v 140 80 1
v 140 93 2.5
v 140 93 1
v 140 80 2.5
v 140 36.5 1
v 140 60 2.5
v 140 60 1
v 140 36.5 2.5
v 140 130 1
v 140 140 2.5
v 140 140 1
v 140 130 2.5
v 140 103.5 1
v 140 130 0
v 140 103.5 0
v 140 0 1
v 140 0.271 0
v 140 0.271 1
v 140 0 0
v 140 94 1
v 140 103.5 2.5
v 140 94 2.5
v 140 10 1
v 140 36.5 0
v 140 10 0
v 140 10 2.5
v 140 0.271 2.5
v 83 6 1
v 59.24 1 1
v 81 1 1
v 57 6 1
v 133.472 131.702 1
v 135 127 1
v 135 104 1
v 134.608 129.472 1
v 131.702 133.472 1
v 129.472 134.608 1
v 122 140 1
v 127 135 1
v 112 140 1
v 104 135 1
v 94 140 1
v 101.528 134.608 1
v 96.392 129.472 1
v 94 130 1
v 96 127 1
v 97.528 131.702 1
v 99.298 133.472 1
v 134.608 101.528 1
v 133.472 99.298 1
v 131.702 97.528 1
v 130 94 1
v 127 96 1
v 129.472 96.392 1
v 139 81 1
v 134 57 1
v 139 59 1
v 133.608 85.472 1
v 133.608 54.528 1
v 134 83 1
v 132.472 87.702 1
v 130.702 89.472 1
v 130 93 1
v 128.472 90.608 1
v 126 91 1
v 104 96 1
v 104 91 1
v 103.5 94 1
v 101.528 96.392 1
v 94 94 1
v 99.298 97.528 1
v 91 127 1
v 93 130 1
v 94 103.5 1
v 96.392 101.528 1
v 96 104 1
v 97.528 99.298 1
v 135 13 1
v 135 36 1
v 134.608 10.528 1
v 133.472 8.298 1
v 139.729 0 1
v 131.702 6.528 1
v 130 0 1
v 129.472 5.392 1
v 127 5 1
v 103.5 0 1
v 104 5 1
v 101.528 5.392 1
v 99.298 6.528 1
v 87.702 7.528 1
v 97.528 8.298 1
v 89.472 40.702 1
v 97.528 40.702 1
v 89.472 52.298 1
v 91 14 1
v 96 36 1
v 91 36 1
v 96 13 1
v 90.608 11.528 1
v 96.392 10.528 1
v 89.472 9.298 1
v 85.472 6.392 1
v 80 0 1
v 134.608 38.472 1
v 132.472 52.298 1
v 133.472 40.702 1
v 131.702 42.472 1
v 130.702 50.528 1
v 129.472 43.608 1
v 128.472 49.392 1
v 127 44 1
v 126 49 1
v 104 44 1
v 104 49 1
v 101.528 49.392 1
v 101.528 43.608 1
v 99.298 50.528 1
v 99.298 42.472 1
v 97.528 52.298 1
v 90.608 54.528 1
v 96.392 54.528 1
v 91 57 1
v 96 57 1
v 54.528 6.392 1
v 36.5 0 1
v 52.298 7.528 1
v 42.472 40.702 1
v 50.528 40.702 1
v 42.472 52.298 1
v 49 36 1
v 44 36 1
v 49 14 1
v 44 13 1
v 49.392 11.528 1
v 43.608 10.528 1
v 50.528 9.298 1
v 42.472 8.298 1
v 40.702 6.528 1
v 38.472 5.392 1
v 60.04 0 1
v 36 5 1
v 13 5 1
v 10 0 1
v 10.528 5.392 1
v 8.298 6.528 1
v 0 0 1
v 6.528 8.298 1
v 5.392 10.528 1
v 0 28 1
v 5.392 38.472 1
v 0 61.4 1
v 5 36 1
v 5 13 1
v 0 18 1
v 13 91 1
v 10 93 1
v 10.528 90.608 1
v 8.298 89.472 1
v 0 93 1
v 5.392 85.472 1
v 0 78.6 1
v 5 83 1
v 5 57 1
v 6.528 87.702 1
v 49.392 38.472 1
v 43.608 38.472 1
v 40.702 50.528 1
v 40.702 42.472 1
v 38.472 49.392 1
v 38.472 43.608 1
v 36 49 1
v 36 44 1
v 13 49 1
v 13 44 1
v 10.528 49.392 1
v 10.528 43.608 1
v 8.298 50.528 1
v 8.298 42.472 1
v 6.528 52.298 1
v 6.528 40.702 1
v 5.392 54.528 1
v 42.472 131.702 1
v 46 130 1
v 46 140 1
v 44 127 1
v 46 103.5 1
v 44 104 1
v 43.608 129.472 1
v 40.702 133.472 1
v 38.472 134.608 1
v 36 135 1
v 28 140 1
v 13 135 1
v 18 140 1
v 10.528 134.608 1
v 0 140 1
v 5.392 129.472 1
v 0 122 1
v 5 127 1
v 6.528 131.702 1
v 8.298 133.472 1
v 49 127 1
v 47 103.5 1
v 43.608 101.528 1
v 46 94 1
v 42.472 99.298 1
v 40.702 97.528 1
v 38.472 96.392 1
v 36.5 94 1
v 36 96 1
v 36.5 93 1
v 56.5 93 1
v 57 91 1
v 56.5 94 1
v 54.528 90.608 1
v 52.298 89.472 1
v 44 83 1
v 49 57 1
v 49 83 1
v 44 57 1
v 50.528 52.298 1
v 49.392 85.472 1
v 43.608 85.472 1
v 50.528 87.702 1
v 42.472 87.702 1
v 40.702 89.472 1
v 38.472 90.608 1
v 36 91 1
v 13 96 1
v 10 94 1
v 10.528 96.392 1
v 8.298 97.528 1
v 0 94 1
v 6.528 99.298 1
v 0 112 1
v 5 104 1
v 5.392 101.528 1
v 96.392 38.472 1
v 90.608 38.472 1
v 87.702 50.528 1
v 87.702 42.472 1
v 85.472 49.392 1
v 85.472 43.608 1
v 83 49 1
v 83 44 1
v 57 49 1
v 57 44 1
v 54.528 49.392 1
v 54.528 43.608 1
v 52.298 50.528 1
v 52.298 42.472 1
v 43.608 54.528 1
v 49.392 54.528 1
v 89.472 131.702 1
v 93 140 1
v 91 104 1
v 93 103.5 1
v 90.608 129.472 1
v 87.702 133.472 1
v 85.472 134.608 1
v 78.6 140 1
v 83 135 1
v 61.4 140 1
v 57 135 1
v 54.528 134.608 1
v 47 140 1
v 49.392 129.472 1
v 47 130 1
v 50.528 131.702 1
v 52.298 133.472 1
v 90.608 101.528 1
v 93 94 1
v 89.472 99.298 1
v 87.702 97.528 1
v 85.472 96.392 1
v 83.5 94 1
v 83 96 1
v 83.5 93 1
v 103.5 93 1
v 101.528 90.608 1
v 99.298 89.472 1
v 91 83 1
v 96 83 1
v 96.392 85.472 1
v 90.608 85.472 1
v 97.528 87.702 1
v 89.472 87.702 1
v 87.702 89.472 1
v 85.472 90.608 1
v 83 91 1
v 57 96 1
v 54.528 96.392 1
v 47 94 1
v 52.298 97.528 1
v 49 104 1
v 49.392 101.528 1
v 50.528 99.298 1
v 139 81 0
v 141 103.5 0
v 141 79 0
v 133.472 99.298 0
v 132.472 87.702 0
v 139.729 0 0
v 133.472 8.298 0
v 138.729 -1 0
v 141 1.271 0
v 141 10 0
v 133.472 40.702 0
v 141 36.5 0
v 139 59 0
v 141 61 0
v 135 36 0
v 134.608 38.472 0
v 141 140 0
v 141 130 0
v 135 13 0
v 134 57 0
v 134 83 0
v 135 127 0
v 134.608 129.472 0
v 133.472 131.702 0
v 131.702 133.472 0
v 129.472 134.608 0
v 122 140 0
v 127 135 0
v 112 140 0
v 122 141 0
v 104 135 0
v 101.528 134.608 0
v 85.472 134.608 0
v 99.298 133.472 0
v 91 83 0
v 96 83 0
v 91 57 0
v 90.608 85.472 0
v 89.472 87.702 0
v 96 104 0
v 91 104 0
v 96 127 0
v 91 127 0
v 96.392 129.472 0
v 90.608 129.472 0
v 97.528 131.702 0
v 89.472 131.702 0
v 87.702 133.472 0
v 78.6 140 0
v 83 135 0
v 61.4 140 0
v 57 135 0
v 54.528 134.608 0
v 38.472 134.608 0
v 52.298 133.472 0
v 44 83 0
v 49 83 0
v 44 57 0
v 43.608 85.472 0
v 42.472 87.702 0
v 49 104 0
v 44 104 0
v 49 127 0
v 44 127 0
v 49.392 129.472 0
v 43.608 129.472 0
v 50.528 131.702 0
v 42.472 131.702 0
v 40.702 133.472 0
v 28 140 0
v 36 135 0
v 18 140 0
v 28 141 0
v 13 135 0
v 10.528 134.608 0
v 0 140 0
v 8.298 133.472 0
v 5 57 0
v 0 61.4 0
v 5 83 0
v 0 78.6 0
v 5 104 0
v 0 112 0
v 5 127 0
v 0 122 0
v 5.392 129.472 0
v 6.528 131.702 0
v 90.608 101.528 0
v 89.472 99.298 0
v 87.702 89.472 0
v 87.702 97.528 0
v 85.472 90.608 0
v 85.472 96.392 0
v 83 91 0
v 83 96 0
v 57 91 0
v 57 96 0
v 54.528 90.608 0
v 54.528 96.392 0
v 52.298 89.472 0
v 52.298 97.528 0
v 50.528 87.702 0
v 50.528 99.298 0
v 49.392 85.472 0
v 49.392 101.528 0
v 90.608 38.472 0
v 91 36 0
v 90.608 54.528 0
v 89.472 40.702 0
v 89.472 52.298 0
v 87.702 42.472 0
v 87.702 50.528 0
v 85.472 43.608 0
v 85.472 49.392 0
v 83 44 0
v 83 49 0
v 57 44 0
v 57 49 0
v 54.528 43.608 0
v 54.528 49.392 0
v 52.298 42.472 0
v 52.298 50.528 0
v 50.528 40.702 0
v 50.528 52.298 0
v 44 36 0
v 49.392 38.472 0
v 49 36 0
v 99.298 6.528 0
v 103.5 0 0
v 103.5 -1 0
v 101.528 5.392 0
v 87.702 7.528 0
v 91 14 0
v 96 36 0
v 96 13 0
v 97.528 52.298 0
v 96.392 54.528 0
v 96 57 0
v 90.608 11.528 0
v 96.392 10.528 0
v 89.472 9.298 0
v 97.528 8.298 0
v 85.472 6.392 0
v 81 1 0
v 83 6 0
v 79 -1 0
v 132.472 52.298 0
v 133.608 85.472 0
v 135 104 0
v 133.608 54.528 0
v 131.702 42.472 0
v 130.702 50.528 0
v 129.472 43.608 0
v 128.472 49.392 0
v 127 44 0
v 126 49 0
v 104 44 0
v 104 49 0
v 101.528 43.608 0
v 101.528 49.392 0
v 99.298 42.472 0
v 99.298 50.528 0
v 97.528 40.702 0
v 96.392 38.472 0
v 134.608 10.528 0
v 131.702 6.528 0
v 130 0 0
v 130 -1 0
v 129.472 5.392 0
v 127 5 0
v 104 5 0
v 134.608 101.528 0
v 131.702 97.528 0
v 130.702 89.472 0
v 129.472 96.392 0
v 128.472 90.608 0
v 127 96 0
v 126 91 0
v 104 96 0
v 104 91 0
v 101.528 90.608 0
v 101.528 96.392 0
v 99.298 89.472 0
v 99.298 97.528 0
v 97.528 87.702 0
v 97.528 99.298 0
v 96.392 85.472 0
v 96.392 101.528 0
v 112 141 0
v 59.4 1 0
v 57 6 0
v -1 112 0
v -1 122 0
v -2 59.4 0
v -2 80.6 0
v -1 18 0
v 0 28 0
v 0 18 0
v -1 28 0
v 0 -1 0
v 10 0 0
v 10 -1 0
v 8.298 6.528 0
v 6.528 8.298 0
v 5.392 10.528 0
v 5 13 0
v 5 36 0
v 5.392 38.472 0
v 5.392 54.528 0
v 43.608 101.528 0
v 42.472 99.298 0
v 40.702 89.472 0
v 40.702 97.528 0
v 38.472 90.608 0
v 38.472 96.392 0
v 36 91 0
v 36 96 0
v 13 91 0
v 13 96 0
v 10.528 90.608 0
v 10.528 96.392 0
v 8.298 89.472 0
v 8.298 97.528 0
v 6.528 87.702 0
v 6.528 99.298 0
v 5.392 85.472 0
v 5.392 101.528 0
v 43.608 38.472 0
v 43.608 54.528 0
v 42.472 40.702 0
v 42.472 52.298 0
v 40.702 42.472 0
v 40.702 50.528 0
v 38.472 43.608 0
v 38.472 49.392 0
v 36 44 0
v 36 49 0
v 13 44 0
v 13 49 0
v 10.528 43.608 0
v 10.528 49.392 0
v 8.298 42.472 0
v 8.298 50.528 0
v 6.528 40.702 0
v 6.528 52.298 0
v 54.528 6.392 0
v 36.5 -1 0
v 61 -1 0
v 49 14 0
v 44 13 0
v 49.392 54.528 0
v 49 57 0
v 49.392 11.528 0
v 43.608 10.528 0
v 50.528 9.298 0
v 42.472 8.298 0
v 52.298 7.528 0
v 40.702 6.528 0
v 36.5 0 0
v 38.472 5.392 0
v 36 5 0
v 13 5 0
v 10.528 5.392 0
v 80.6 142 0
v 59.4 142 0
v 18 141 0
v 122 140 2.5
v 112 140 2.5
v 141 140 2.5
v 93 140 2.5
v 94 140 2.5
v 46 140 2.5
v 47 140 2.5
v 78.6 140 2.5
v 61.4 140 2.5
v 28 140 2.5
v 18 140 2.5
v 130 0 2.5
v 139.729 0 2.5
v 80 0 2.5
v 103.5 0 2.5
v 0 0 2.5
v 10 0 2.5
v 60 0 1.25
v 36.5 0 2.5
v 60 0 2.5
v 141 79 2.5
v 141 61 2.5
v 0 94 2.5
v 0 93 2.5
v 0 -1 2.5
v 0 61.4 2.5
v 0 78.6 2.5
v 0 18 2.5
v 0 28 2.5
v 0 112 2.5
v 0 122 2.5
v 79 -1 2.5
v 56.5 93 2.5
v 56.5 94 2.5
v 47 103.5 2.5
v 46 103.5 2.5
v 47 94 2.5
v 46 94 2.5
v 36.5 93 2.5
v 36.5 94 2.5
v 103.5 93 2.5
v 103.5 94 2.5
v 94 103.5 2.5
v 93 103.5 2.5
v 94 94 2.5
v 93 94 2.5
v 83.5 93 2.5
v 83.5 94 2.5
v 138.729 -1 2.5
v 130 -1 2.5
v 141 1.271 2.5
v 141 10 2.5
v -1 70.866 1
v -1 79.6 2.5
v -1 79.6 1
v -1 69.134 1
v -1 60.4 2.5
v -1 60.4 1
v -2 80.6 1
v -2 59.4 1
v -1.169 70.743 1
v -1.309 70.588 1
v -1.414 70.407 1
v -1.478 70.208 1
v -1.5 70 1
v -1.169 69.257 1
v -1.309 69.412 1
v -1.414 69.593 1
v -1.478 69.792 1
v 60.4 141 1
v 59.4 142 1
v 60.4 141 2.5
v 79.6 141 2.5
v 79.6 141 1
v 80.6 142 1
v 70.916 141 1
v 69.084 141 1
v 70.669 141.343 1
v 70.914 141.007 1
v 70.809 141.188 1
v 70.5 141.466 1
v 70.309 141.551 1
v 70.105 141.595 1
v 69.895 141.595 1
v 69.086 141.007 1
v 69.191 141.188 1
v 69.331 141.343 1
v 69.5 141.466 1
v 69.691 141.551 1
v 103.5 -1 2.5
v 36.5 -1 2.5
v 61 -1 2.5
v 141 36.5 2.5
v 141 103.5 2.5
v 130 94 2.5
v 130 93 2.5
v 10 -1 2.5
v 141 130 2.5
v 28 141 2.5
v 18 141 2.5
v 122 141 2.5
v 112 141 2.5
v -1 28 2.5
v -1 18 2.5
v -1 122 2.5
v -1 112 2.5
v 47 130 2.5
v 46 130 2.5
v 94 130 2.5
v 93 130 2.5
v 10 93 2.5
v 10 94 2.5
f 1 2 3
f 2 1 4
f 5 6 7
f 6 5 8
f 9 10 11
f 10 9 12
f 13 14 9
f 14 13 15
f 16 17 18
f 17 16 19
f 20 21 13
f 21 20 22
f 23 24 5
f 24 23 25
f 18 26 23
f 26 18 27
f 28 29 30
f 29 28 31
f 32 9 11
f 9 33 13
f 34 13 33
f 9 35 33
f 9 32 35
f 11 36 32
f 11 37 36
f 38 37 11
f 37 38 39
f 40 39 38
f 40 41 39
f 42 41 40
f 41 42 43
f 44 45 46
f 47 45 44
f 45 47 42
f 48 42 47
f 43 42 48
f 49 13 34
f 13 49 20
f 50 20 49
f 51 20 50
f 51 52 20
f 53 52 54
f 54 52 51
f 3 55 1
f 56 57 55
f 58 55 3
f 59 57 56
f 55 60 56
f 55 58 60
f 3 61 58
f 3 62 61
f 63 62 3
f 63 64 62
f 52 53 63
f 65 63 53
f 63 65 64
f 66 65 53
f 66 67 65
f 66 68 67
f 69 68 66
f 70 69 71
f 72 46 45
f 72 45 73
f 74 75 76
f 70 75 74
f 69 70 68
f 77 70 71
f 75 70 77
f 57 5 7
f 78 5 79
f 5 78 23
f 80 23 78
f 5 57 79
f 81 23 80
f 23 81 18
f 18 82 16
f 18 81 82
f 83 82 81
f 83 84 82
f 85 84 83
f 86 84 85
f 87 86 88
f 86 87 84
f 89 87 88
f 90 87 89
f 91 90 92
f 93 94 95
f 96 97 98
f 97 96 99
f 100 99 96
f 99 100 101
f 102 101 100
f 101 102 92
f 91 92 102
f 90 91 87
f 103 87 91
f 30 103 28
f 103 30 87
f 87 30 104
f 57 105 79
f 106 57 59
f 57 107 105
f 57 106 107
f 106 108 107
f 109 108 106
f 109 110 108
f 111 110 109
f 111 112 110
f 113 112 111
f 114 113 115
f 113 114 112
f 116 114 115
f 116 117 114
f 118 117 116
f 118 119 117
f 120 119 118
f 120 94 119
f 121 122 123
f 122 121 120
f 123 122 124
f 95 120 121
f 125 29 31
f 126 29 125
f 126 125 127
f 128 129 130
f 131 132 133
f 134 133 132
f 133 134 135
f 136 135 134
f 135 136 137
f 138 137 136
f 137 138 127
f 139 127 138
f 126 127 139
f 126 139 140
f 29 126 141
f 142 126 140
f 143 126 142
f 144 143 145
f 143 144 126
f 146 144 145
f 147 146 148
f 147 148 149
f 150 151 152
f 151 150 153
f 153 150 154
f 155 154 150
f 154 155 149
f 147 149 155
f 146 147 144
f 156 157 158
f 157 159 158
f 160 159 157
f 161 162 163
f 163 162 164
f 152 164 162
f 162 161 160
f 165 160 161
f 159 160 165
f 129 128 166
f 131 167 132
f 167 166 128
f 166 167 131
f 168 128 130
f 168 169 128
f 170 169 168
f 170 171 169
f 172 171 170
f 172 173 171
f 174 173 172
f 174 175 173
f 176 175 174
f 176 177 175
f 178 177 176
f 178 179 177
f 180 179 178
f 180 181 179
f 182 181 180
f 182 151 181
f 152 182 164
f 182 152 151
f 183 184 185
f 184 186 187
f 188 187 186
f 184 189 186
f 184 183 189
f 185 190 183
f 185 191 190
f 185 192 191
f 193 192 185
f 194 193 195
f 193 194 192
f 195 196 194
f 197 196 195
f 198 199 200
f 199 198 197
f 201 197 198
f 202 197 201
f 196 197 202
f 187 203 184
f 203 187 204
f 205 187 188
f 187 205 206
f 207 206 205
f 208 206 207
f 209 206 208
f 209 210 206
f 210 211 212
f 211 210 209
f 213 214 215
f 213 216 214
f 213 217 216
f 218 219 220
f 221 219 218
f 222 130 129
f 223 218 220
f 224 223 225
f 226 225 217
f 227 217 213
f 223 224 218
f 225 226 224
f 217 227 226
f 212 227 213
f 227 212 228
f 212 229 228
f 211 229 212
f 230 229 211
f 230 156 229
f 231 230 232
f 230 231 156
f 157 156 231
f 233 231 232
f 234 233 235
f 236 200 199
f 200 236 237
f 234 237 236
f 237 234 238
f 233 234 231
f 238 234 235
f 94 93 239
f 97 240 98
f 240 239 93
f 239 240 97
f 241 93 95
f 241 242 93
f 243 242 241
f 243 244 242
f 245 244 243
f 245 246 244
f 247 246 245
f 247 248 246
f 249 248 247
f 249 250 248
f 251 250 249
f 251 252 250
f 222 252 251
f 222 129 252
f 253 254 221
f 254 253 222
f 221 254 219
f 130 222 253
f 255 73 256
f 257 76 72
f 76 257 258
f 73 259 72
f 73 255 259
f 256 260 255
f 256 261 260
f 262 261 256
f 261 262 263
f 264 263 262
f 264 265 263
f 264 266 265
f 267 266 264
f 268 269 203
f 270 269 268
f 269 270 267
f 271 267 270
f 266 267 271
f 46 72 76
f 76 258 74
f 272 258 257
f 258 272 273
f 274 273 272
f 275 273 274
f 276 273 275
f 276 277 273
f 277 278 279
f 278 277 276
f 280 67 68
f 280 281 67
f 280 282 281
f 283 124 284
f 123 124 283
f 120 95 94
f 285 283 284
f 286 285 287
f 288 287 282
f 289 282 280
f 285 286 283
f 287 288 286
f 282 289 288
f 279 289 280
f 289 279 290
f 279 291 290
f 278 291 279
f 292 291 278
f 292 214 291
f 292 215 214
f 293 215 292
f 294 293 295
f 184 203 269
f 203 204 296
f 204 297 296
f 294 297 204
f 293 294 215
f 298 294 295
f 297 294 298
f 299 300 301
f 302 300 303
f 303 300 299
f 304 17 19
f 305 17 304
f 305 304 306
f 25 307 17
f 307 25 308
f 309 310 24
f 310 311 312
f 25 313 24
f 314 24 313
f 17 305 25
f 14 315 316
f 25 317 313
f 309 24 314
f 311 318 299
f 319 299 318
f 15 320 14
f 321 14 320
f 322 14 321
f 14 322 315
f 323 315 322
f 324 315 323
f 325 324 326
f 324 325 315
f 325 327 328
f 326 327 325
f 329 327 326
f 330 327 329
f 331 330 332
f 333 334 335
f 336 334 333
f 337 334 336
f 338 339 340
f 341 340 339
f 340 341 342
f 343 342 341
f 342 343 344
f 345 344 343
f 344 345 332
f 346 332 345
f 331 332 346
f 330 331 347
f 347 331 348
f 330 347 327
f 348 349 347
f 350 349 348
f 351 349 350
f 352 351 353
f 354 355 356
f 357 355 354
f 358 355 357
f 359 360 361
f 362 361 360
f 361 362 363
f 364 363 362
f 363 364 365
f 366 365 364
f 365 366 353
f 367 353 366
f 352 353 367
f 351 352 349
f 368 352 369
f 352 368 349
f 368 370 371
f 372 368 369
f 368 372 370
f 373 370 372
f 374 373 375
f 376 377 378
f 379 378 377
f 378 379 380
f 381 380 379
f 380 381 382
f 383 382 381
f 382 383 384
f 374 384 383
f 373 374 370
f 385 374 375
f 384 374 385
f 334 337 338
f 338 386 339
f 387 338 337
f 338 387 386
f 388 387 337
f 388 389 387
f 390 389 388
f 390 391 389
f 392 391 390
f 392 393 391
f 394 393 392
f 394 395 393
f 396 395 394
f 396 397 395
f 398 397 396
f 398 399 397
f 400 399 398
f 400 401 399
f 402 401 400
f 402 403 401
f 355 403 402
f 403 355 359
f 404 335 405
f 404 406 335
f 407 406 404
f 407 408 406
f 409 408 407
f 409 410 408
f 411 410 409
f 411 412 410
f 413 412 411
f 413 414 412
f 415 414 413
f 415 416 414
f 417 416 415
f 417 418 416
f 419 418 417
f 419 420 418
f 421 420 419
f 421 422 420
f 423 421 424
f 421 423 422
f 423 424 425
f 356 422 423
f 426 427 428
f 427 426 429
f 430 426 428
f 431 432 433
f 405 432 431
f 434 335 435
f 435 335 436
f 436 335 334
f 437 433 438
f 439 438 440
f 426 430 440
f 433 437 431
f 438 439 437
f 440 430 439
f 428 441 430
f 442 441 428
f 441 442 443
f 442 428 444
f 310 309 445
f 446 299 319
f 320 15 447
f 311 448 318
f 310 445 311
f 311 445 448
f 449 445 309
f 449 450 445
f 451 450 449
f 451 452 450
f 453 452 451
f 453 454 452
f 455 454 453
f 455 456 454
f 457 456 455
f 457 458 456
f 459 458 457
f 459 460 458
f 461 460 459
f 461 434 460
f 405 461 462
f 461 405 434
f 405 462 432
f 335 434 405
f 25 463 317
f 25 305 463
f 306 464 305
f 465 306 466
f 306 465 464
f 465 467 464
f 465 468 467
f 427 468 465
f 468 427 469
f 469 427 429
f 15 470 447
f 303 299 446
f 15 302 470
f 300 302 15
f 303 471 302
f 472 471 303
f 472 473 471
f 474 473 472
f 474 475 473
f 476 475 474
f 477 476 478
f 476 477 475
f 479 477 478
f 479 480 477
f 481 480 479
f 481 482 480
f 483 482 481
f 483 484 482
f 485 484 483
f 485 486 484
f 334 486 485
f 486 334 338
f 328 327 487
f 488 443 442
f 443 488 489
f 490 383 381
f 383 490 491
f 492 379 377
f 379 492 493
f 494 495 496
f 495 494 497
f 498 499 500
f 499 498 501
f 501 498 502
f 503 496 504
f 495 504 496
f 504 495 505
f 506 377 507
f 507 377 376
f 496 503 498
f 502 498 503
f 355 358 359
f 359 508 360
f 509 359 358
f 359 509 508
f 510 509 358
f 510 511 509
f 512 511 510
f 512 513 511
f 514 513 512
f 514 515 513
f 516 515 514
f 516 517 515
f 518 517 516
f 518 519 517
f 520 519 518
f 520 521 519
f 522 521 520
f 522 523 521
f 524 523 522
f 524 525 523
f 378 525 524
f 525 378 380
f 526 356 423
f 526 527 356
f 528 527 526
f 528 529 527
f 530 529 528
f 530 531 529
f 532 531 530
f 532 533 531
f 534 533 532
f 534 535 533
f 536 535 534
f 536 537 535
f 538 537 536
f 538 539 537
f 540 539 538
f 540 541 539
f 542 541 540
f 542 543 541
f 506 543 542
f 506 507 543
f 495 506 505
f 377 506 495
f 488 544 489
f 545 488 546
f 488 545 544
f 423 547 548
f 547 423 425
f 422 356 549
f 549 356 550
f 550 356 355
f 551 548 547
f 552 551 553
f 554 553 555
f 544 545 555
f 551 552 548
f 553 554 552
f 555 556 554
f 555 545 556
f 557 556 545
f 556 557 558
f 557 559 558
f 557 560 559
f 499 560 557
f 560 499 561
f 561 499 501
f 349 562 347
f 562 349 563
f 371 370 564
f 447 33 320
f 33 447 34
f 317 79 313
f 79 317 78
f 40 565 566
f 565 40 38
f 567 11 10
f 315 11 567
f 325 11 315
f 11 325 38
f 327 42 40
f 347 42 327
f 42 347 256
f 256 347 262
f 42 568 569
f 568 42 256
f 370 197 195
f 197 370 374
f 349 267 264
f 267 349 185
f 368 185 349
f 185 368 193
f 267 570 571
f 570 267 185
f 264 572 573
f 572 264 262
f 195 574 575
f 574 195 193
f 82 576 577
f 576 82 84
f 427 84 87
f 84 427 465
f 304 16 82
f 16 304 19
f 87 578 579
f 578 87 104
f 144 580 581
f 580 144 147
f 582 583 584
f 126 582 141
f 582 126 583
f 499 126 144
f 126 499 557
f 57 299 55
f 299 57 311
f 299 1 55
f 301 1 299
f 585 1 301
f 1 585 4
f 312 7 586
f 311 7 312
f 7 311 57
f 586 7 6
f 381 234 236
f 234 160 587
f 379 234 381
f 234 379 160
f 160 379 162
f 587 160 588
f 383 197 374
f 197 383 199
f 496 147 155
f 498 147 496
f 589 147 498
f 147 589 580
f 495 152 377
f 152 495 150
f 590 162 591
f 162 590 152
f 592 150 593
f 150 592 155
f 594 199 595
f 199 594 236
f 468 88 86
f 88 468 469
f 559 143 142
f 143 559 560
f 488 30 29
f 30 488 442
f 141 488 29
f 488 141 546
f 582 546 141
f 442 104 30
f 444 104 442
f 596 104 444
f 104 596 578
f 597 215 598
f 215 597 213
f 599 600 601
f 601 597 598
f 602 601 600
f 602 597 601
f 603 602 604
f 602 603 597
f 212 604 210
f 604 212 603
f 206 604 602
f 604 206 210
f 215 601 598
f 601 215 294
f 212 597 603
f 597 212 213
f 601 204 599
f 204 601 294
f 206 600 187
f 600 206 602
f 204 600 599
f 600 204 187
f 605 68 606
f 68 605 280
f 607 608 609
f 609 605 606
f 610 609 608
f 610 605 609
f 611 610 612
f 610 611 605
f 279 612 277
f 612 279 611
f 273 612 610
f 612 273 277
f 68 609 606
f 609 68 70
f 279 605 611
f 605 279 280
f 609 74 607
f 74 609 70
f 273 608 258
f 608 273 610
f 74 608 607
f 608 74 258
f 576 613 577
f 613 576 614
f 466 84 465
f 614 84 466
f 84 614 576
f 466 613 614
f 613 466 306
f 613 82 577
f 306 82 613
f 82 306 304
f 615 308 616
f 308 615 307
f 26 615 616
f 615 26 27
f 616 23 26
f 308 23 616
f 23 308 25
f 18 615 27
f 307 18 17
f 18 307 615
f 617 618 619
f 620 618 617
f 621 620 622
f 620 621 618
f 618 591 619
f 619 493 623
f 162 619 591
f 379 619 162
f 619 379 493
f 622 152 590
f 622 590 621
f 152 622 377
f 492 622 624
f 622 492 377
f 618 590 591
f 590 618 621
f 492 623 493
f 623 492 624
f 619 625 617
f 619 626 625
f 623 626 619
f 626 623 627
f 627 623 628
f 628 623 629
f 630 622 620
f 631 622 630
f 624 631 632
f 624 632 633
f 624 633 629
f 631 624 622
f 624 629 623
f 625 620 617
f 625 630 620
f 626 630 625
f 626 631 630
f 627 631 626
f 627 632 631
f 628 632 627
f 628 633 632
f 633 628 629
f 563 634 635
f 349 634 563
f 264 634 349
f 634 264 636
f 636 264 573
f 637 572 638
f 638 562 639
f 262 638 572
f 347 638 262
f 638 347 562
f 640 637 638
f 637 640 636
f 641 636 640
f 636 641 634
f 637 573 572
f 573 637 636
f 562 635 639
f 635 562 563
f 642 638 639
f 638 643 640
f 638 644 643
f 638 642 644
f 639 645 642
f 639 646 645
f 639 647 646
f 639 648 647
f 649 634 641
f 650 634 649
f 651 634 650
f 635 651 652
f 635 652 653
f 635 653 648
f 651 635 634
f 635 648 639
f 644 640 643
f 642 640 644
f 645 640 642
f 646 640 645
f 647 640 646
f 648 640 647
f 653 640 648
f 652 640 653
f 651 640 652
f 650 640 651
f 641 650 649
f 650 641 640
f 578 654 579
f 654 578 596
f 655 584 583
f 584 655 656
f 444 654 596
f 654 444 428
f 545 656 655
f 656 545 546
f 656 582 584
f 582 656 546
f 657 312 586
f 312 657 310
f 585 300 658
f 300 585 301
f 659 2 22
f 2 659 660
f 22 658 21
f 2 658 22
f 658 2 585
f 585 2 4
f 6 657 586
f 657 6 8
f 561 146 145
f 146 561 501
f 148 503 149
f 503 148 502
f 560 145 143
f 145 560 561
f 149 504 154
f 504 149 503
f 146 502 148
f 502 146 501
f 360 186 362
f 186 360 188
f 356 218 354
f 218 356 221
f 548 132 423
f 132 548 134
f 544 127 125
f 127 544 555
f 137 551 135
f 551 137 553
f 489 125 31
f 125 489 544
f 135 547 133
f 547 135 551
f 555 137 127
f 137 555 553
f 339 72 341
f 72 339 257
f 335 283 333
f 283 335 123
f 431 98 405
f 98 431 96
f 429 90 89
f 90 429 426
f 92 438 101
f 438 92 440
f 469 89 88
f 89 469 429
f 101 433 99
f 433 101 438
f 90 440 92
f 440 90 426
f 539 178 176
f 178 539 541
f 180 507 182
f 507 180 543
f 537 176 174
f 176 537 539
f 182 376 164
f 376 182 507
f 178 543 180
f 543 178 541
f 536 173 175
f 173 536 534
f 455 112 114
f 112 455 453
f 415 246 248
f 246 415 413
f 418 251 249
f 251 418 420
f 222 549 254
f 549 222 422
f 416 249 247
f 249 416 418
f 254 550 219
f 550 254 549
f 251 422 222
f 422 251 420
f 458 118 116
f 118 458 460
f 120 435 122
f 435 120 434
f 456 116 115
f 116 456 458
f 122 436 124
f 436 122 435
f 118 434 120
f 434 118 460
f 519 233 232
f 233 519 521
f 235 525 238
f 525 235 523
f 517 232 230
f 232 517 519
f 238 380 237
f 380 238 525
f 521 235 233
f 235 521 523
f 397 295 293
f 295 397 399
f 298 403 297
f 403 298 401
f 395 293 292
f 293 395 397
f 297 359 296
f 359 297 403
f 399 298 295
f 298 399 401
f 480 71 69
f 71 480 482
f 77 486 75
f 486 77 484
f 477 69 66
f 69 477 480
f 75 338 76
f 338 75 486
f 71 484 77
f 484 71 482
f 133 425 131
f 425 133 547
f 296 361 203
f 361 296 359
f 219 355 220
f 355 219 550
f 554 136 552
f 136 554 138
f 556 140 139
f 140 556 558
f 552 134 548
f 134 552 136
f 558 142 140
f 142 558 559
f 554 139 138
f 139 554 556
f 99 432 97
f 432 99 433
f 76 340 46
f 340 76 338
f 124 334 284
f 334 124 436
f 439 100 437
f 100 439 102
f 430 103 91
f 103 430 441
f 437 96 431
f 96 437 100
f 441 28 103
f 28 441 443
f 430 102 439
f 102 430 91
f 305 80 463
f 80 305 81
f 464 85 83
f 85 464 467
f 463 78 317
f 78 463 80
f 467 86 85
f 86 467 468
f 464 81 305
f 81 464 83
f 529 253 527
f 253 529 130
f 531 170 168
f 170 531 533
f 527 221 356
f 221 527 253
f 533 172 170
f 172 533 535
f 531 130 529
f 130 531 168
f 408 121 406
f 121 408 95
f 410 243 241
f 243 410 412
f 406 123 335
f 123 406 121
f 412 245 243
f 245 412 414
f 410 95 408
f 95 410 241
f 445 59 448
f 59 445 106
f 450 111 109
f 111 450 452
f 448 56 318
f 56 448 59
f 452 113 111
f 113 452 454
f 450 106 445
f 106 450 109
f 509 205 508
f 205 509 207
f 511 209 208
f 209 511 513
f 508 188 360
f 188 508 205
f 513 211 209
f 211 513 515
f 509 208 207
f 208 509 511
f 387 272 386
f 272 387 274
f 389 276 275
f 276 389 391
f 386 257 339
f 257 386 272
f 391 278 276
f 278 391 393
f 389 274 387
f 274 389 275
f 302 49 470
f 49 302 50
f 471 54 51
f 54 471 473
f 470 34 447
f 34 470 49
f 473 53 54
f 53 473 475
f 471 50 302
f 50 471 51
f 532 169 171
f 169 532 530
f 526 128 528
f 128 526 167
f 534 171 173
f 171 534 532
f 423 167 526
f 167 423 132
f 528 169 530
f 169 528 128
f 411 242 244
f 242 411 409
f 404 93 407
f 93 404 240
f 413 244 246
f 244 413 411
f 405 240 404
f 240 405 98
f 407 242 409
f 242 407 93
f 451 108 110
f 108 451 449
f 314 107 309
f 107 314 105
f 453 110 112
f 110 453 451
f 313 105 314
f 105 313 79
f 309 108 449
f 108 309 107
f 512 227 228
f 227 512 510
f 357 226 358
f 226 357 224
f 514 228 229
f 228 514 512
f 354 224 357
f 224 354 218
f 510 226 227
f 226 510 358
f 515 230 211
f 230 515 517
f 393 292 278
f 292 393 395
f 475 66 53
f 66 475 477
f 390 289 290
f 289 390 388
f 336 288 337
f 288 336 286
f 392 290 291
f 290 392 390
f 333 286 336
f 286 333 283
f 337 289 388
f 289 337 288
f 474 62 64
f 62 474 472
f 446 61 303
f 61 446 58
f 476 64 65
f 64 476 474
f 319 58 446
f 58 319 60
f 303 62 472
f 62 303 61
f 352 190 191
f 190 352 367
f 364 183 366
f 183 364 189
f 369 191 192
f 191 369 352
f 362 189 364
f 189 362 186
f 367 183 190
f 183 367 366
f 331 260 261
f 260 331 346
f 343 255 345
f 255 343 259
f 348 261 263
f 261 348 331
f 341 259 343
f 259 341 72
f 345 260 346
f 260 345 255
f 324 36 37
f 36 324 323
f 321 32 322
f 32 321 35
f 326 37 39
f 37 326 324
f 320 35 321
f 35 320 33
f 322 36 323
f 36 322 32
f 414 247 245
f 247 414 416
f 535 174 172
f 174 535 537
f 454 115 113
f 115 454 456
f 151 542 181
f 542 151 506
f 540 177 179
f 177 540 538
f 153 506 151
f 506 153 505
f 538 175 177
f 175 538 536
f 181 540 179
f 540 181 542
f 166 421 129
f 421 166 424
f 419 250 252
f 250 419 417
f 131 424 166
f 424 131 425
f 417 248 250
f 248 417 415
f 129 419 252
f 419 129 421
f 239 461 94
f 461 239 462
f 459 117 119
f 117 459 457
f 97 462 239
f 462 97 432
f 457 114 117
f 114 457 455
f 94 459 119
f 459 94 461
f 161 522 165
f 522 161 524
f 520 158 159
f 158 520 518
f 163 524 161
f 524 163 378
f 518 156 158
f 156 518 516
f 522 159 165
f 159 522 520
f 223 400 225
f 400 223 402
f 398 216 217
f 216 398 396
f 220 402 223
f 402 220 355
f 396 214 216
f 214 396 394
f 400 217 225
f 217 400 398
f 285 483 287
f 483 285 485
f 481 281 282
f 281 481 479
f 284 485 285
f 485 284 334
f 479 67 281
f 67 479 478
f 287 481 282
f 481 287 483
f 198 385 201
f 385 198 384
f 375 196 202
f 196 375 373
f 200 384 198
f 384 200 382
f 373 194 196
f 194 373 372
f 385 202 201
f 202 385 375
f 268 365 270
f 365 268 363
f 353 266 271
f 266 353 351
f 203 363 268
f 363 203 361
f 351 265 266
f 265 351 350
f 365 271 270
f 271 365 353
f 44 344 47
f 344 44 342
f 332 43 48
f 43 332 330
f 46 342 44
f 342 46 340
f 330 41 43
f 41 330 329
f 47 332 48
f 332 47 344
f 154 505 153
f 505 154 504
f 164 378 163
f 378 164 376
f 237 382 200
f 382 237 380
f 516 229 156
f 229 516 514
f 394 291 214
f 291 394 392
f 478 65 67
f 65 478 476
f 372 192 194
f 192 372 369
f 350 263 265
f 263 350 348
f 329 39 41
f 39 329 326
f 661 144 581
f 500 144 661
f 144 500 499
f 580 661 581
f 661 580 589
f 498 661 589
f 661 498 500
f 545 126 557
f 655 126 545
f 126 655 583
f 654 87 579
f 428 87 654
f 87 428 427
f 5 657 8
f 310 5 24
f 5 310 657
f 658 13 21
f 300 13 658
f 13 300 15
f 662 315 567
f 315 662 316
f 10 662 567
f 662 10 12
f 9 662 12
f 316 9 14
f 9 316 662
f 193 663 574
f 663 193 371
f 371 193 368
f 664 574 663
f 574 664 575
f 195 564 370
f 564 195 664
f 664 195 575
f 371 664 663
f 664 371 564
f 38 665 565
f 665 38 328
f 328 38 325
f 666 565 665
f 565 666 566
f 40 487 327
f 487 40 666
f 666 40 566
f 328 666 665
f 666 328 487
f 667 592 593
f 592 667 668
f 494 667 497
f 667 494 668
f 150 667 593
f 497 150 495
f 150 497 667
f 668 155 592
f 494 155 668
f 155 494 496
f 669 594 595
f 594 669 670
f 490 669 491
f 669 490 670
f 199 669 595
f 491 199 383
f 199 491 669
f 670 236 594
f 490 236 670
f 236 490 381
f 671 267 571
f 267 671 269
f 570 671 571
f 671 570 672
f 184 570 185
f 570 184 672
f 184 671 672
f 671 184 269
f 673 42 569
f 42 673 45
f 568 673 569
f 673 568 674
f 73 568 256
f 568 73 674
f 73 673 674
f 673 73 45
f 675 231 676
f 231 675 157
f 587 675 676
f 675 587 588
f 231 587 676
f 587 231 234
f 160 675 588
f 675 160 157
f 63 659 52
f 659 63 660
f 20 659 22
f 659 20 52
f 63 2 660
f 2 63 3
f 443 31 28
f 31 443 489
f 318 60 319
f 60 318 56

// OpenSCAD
baseheight = 1;
wallheight = 2.5;
wallwidth = 1;
crosslength = 20;
tileside = 46;
floorwidth = 5;
totalwidth = 3*tileside+2*wallwidth;
firstdividecenter = tileside+wallwidth/2;
seconddividecenter = tileside*2+wallwidth+wallwidth/2;
centerfirsttile = tileside/2;
centersecondtile = tileside+wallwidth+tileside/2;
centerthirdtile = tileside*2+wallwidth*2+tileside/2;
dovewidth = 17.2;
negdovewidth = 18;
cornerradius = 8; //4;

module centercross (xpos, ypos, zpos) {
	translate( [xpos, ypos, zpos]) 
		translate ([-crosslength/2,-wallwidth/2, 0]) cube ([crosslength, wallwidth, wallheight]);
	translate ( [xpos, ypos, zpos])
		translate ([-wallwidth/2,-crosslength/2, 0]) cube ([wallwidth, crosslength, wallheight]);
} // module

module centerT (xpos, ypos, zpos, rotation) {
    translate( [xpos, ypos, zpos]) rotate([0, 0, rotation]) 
        translate ([-crosslength/2,-wallwidth/2, 0]) cube ([crosslength, wallwidth, wallheight]);
    translate ( [xpos, ypos, zpos]) rotate([0, 0, rotation]) 
        translate ([-wallwidth/2,0, 0]) cube ([wallwidth, crosslength/2, wallheight]);
} // module

module corner (xpos, ypos, zpos) {
	translate ( [xpos, ypos, zpos]) 
	difference () {
		cube ([floorwidth+cornerradius, floorwidth+cornerradius, baseheight]);
		translate ([floorwidth+cornerradius, floorwidth+cornerradius, 0]) cylinder (3, r=cornerradius, $fn=20);
	} // difference
} // module corner

// y-direction floorbeams - translate to near edge of beam, then draw
cube ([floorwidth, totalwidth, baseheight]);
translate ([firstdividecenter-floorwidth/2, 0, 0]) cube ([floorwidth, totalwidth, baseheight]);
translate ([tileside+wallwidth+tileside+wallwidth/2-floorwidth/2, 0, 0]) cube ([floorwidth, totalwidth, baseheight]);

difference () {
    //wall fill for dovetail
    translate ([totalwidth-floorwidth, 0, 0]) cube ([floorwidth, totalwidth, baseheight]);

    //negative dovetail far y axis
    translate([totalwidth+wallwidth, tileside+wallwidth+tileside/2, 0])  
        polyhedron  (
        points = [[0, -negdovewidth/2 ,0], [0, -negdovewidth/2, wallheight], [0,negdovewidth/2,wallheight], [0,negdovewidth/2,0], 
            [-wallwidth*2, negdovewidth/2+2, 0], [-wallwidth*2, negdovewidth/2+2, wallheight], 
            [-wallwidth*2, -negdovewidth/2-2, wallheight], [-wallwidth*2, -negdovewidth/2-2, 0]],
        faces = [[0,1,2], [2,3,0], [4,5,6], [6,7,4],
             [0,7,6], [6,1,0], [3,2,5], [5,4,3],
            [1,6,5], [5,2,1], [0,3,4], [4,7,0],  ]);
} // difference

// x-direction floorbeams - translate to near edge of beam, then draw

difference () {
cube([totalwidth,floorwidth,baseheight]);

// negative dovetail near x axis
translate ([tileside+wallwidth+tileside/2, -wallwidth,0])  
	polyhedron  (
	points = [[-negdovewidth/2, 0, 0], [-negdovewidth/2, 0, wallheight], 
		[negdovewidth/2,0, wallheight], [negdovewidth/2, 0, 0], 
		[negdovewidth/2+2, wallwidth*2,0], [negdovewidth/2+2, wallwidth*2, wallheight], 
		[-negdovewidth/2-2, wallwidth*2, wallheight], [-dovewidth/2-2, wallwidth*2, 0]],
	faces = [[0, 1, 2], [2, 3, 0], [4, 5, 6], [6, 7, 4],
		 [0, 7, 6], [6, 1, 0], [3, 2, 5], [5, 4, 3],
		[1, 6, 5], [5, 2, 1], [0, 3, 4], [4, 7, 0],  ]);
} // difference

translate ([0, firstdividecenter-floorwidth/2, 0]) cube ([totalwidth, floorwidth, baseheight]);
translate ([0, tileside+wallwidth+tileside+wallwidth/2-floorwidth/2, 0]) cube ([totalwidth, floorwidth, baseheight]);
translate ([0, totalwidth-floorwidth,0]) cube ([totalwidth, floorwidth, baseheight]);

// four center crosses - translate to center of cross, then translate back and draw
// centercross (firstdividecenter, firstdividecenter, 0);
centerT (firstdividecenter, seconddividecenter, 0);
// centerT (seconddividecenter, firstdividecenter, 0, 270);
centerT (seconddividecenter, seconddividecenter, 0);

//walls on x-axis
 translate ([0, -wallwidth, 0]) cube ([crosslength/2, wallwidth, wallheight]);
 translate ([tileside+wallwidth/2-crosslength/2, -wallwidth,0]) cube ([crosslength, wallwidth, wallheight]);
translate ([tileside*2+wallwidth+wallwidth/2-wallwidth/2, -wallwidth, 0]) cube ([crosslength/2+wallwidth/2, wallwidth, wallheight]);

difference () {
    translate ([totalwidth-crosslength/2, -wallwidth, 0]) cube ([crosslength/2, wallwidth, wallheight]);
    translate ([totalwidth+2*wallwidth, -2.3*wallwidth-floorwidth/2, 0]) rotate (45) cube (floorwidth, floorwidth, wallheight);
} // difference

// walls on y-axis, far side

difference () {
translate ([totalwidth, -wallwidth,0]) cube ([wallwidth, crosslength/2+wallwidth, wallheight]);
translate ([totalwidth+2*wallwidth, -2.3*wallwidth-floorwidth/2, 0]) rotate (45) cube (floorwidth, floorwidth, wallheight);
} // difference

translate ([totalwidth, tileside+wallwidth/2-crosslength/2,0]) cube([wallwidth,crosslength,wallheight]);
translate ([totalwidth, tileside*2+wallwidth+wallwidth/2-crosslength/2,0]) cube ([wallwidth, crosslength, wallheight]);
translate ([totalwidth, totalwidth-crosslength/2, 0]) cube ([wallwidth, crosslength/2, wallheight]);

// walls on x-axis, far side
translate ([centerfirsttile - crosslength/4, totalwidth, 0]) cube ([crosslength/2, wallwidth, wallheight]);
 translate ([centersecondtile - crosslength/4, totalwidth, 0]) cube ([crosslength/2, wallwidth, wallheight]);
translate ([centerthirdtile - crosslength/4, totalwidth, 0]) cube ([crosslength/2, wallwidth, wallheight]);

// walls on y-axis, near side
 translate ([-wallwidth, centerfirsttile - crosslength/4, 0]) cube ([wallwidth, crosslength/2, wallheight]);
 translate ([-wallwidth, centersecondtile - crosslength/4, 0]) cube ([wallwidth, crosslength/2, wallheight]);
translate ([-wallwidth, centerthirdtile - crosslength/4, 0]) cube ([wallwidth, crosslength/2, wallheight]);

// "t's" off of walls, x-axis near
// translate ([firstdividecenter - wallwidth/2, 0, 0]) cube ([wallwidth, crosslength/2, wallheight]);
// translate ([seconddividecenter - wallwidth/2, 0, 0]) cube ([wallwidth, crosslength/2, wallheight]);
// "t's" off of walls, x-axis far
translate ([firstdividecenter - wallwidth/2,  totalwidth - crosslength/2, 0]) cube ([wallwidth, crosslength/2, wallheight]);
translate ([seconddividecenter - wallwidth/2,  totalwidth - crosslength/2, 0]) cube ([wallwidth, crosslength/2, wallheight]);
// "t's" off of walls, y-axis near
// translate ([0, firstdividecenter - wallwidth/2, 0]) cube ([crosslength/2,  wallwidth,  wallheight]);
translate ([0, seconddividecenter - wallwidth/2, 0]) cube ([crosslength/2,  wallwidth,  wallheight]);
// "t's" off of walls, y-axis far
// translate ([totalwidth - crosslength/2,  firstdividecenter - wallwidth/2, 0]) cube ([crosslength/2, wallwidth, wallheight]);
translate ([totalwidth - crosslength/2,  seconddividecenter - wallwidth/2, 0]) cube ([crosslength/2, wallwidth, wallheight]);

// solid divider sections for dovetail
// translate ([totalwidth/2 - tileside/2,  -wallwidth, 0]) cube ([tileside, wallwidth, wallheight]);
// translate ([totalwidth, totalwidth/2 - tileside/2, 0]) cube ([wallwidth, tileside, wallheight]);
//dovetail near y axis
difference () {
translate ([0, tileside + wallwidth + tileside/2, 0])  {
	polyhedron  (
	points = [[0, -dovewidth/2, 0], [0, -dovewidth/2, wallheight], [0, dovewidth/2, wallheight], 
		[0, dovewidth/2,  0],  [-wallwidth, dovewidth/2 + 1, 0], [-wallwidth, dovewidth/2 + 1, wallheight], 
		[-wallwidth, -dovewidth/2-1, wallheight],  [-wallwidth, -dovewidth/2-1,  0]], 
	faces = [[0, 1, 2], [2, 3, 0], [4, 5, 6], [6, 7, 4], 
		 [0, 7, 6], [6, 1,  0], [3, 2, 5], [5, 4, 3], 
		[1, 6, 5], [5, 2, 1], [0, 3, 4], [4, 7, 0],  ]);
	polyhedron  (
	points = [[0,  -dovewidth/2,  0],  [0,  -dovewidth/2,  baseheight],  [0,  dovewidth/2,  baseheight],  
		[0,  dovewidth/2,  0],  [-wallwidth*2,  dovewidth/2 + 2,  0],  
		[-wallwidth*2,  dovewidth/2 + 2,  baseheight],  [-wallwidth*2,  -dovewidth/2 - 2,  baseheight],  
		[-wallwidth*2,  -dovewidth/2 - 2,  0]], 
	faces = [[0, 1, 2], [2, 3, 0], [4, 5, 6], [6, 7, 4], 
		 [0, 7, 6], [6, 1, 0], [3, 2, 5],  [5, 4, 3], 
		[1, 6, 5], [5, 2, 1], [0, 3, 4], [4, 7, 0], ]);
}  //translate
translate ([-.5, totalwidth/2, 1]) cylinder (h = 5, r=1, $fn = 30);
}

//dovetail far x axis
difference () {
translate ([tileside + wallwidth + tileside/2, totalwidth, 0]) { 
	polyhedron  (
	points = [[-dovewidth/2, 0, 0],  [-dovewidth/2, 0, wallheight],  [dovewidth/2, 0, wallheight],  
		[dovewidth/2, 0, 0],  [dovewidth/2 + 1, wallwidth, 0],  [dovewidth/2 + 1, wallwidth, wallheight],  
		[-dovewidth/2 - 1, wallwidth, wallheight],  	[-dovewidth/2 - 1, wallwidth, 0]], 
	faces = [[0, 1, 2],  [2, 3, 0],  [4, 5, 6],  [6, 7, 4], 
		 [0, 7, 6],  [6, 1, 0],  [3, 2, 5],  [5, 4, 3], 
		[1, 6, 5],  [5, 2, 1],  [0, 3, 4],  [4, 7, 0],   ]);
	polyhedron  (
	points = [[-dovewidth/2, 0, 0],  [-dovewidth/2, 0, baseheight],  [dovewidth/2, 0, baseheight],  
		[dovewidth/2, 0, 0],  [dovewidth/2 + 2, wallwidth*2, 0],  [dovewidth/2 + 2, wallwidth*2, baseheight],  
		[-dovewidth/2 - 2, wallwidth*2, baseheight],  [-dovewidth/2 - 2, wallwidth*2, 0]], 
	faces = [[0, 1, 2],  [2, 3, 0],  [4, 5, 6],  [6, 7, 4], 
		 [0, 7, 6],  [6, 1, 0],  [3, 2, 5],  [5, 4, 3], 
		[1, 6, 5],  [5, 2, 1],  [0, 3, 4],  [4, 7, 0],   ]);
} // translate
translate ([totalwidth/2, totalwidth+.6, 1]) cylinder (h = 5, r=1, $fn = 30);
}

//added base width near dovetail cutouts
translate ([firstdividecenter, floorwidth, 0]) cube([tileside + wallwidth*2,  wallwidth, baseheight]);
translate ([totalwidth - floorwidth - wallwidth, firstdividecenter, 0]) cube([wallwidth, tileside + wallwidth*2, baseheight]);

difference() {
//wall fill for dovetail
translate ([totalwidth/2 - tileside/2 , -wallwidth, 0]) cube([tileside, wallwidth, wallheight]);

//negative dovetail near x axis
translate ([tileside + wallwidth + tileside/2, -wallwidth, 0])  
	polyhedron  (
	points = [[-negdovewidth/2, 0, 0],  [-negdovewidth/2, 0, wallheight],  
		[negdovewidth/2, 0, wallheight],  [negdovewidth/2, 0, 0],  
		[negdovewidth/2 + 2, wallwidth*2, 0],  [negdovewidth/2 + 2, wallwidth*2, wallheight],  
		[-negdovewidth/2 - 2, wallwidth*2, wallheight],  [-dovewidth/2-2, wallwidth*2, 0]], 
	faces = [[0, 1, 2],  [2, 3, 0],  [4, 5, 6],  [6, 7, 4], 
		 [0, 7, 6],  [6, 1, 0],  [3, 2, 5],  [5, 4, 3], 
		[1, 6, 5],  [5, 2, 1],  [0, 3, 4],  [4, 7, 0],   ]);
	} // polyhedron

difference() {
//wall fill for dovetail
translate ([totalwidth, totalwidth/2-tileside/2, 0]) cube([wallwidth, tileside, wallheight]);

//negative dovetail far y axis
translate ([totalwidth + wallwidth, tileside + wallwidth + tileside/2, 0])  
	polyhedron  (
	points = [[0, -negdovewidth/2, 0],  [0, -negdovewidth/2, wallheight],  [0, negdovewidth/2, wallheight],  
		[0, negdovewidth/2, 0],  [-wallwidth*2, negdovewidth/2 + 2, 0],  
		[-wallwidth*2, negdovewidth/2 + 2, wallheight],  [-wallwidth*2, -negdovewidth/2-2, wallheight],  
		[-wallwidth*2, -negdovewidth/2 - 2, 0]], 
	faces = [[0, 1, 2],  [2, 3, 0],  [4, 5, 6],  [6, 7, 4], 
		 [0, 7, 6],  [6, 1, 0],  [3, 2, 5],  [5, 4, 3], 
		[1, 6, 5],  [5, 2, 1],  [0, 3, 4],  [4, 7, 0],   ]);
} // difference

corner (0, 0, 0);
corner (firstdividecenter + floorwidth/2 - floorwidth, wallwidth, 0);
corner (seconddividecenter + floorwidth/2 - floorwidth, 0, 0);
corner (0, firstdividecenter + floorwidth/2 - floorwidth, 0);
corner (firstdividecenter + floorwidth/2 - floorwidth, firstdividecenter + floorwidth/2 - floorwidth, 0);
corner (seconddividecenter + floorwidth/2 - floorwidth, firstdividecenter + floorwidth/2 - floorwidth, 0);
corner (0, seconddividecenter + floorwidth/2 - floorwidth, 0);
corner (firstdividecenter + floorwidth/2 - floorwidth, seconddividecenter + floorwidth/2 - floorwidth, 0);
corner (seconddividecenter + floorwidth/2 - floorwidth, seconddividecenter + floorwidth/2 - floorwidth, 0);

translate ([firstdividecenter + floorwidth/2, 0, 0])  { rotate (a = 90, v = [0, 0, 1]) { corner (0, 0, 0); }}
translate ([seconddividecenter + floorwidth/2, wallwidth, 0])  { rotate (a = 90, v = [0, 0, 1]) { corner (0, 0, 0); }}
translate ([totalwidth, 0, 0])  { rotate (a = 90, v = [0, 0, 1]) { corner (0, 0, 0); }}
translate ([firstdividecenter + floorwidth/2, firstdividecenter - floorwidth/2, 0])  { rotate (a = 90, v = [0, 0, 1]) { corner (0, 0, 0); }}
translate ([seconddividecenter + floorwidth/2, firstdividecenter - floorwidth/2, 0])  { rotate (a = 90, v = [0, 0, 1]) { corner (0, 0, 0); }}
translate ([totalwidth-wallwidth, firstdividecenter - floorwidth/2, 0])  { rotate (a = 90, v = [0, 0, 1]) { corner (0, 0, 0); }}
translate ([firstdividecenter + floorwidth/2, seconddividecenter - floorwidth/2, 0])  { rotate (a = 90, v = [0, 0, 1]) { corner (0, 0, 0); }}
translate ([seconddividecenter + floorwidth/2, seconddividecenter - floorwidth/2, 0])  { rotate (a = 90, v = [0, 0, 1]) { corner (0, 0, 0); }}
translate ([totalwidth, seconddividecenter - floorwidth/2, 0])  { rotate (a = 90, v = [0, 0, 1]) { corner (0, 0, 0); }}

translate ([firstdividecenter + floorwidth/2, firstdividecenter + floorwidth/2, 0])  { rotate (a = 180, v = [0, 0, 1]) { corner (0, 0, 0); }}
translate ([seconddividecenter + floorwidth/2, firstdividecenter + floorwidth/2, 0])  { rotate (a = 180, v = [0, 0, 1]) { corner (0, 0, 0); }}
translate ([totalwidth, firstdividecenter + floorwidth/2, 0])  { rotate (a = 180, v = [0, 0, 1]) { corner (0, 0, 0); }}
translate ([firstdividecenter + floorwidth/2, seconddividecenter + floorwidth/2, 0])  { rotate (a = 180, v = [0, 0, 1]) { corner (0, 0, 0); }}
translate ([seconddividecenter + floorwidth/2, seconddividecenter + floorwidth/2, 0])  { rotate (a = 180, v = [0, 0, 1]) { corner (0, 0, 0); }}
translate ([totalwidth-wallwidth, seconddividecenter + floorwidth/2, 0])  { rotate (a = 180, v = [0, 0, 1]) { corner (0, 0, 0); }}
translate ([firstdividecenter + floorwidth/2, totalwidth, 0])  { rotate (a = 180, v = [0, 0, 1]) { corner (0, 0, 0); }}
translate ([seconddividecenter + floorwidth/2, totalwidth, 0])  { rotate (a = 180, v = [0, 0, 1]) { corner (0, 0, 0); }}
translate ([totalwidth, totalwidth, 0])  { rotate (a = 180, v = [0, 0, 1]) { corner (0, 0, 0); }}

translate ([0, firstdividecenter + floorwidth/2, 0])  { rotate (a = 270, v = [0, 0, 1]) { corner (0, 0, 0); }}
translate ([firstdividecenter - floorwidth/2, firstdividecenter + floorwidth/2, 0])  { rotate (a = 270, v = [0, 0, 1]) { corner (0, 0, 0); }}
translate ([seconddividecenter - floorwidth/2, firstdividecenter + floorwidth/2, 0])  { rotate (a = 270, v = [0, 0, 1]) { corner (0, 0, 0); }}

translate ([0, seconddividecenter + floorwidth/2, 0])  { rotate (a = 270, v = [0, 0, 1]) { corner (0, 0, 0); }}
translate ([firstdividecenter - floorwidth/2, seconddividecenter + floorwidth/2, 0])  { rotate (a = 270, v = [0, 0, 1]) { corner (0, 0, 0); }}
translate ([seconddividecenter - floorwidth/2, seconddividecenter + floorwidth/2, 0])  { rotate (a = 270, v = [0, 0, 1]) { corner (0, 0, 0); }}

translate ([0, totalwidth, 0])  { rotate (a = 270, v = [0, 0, 1]) { corner (0, 0, 0); }}
translate ([firstdividecenter - floorwidth/2, totalwidth, 0])  { rotate (a = 270, v = [0, 0, 1]) { corner (0, 0, 0); }}
translate ([seconddividecenter - floorwidth/2, totalwidth, 0])  { rotate (a = 270, v = [0, 0, 1]) { corner (0, 0, 0); }}
